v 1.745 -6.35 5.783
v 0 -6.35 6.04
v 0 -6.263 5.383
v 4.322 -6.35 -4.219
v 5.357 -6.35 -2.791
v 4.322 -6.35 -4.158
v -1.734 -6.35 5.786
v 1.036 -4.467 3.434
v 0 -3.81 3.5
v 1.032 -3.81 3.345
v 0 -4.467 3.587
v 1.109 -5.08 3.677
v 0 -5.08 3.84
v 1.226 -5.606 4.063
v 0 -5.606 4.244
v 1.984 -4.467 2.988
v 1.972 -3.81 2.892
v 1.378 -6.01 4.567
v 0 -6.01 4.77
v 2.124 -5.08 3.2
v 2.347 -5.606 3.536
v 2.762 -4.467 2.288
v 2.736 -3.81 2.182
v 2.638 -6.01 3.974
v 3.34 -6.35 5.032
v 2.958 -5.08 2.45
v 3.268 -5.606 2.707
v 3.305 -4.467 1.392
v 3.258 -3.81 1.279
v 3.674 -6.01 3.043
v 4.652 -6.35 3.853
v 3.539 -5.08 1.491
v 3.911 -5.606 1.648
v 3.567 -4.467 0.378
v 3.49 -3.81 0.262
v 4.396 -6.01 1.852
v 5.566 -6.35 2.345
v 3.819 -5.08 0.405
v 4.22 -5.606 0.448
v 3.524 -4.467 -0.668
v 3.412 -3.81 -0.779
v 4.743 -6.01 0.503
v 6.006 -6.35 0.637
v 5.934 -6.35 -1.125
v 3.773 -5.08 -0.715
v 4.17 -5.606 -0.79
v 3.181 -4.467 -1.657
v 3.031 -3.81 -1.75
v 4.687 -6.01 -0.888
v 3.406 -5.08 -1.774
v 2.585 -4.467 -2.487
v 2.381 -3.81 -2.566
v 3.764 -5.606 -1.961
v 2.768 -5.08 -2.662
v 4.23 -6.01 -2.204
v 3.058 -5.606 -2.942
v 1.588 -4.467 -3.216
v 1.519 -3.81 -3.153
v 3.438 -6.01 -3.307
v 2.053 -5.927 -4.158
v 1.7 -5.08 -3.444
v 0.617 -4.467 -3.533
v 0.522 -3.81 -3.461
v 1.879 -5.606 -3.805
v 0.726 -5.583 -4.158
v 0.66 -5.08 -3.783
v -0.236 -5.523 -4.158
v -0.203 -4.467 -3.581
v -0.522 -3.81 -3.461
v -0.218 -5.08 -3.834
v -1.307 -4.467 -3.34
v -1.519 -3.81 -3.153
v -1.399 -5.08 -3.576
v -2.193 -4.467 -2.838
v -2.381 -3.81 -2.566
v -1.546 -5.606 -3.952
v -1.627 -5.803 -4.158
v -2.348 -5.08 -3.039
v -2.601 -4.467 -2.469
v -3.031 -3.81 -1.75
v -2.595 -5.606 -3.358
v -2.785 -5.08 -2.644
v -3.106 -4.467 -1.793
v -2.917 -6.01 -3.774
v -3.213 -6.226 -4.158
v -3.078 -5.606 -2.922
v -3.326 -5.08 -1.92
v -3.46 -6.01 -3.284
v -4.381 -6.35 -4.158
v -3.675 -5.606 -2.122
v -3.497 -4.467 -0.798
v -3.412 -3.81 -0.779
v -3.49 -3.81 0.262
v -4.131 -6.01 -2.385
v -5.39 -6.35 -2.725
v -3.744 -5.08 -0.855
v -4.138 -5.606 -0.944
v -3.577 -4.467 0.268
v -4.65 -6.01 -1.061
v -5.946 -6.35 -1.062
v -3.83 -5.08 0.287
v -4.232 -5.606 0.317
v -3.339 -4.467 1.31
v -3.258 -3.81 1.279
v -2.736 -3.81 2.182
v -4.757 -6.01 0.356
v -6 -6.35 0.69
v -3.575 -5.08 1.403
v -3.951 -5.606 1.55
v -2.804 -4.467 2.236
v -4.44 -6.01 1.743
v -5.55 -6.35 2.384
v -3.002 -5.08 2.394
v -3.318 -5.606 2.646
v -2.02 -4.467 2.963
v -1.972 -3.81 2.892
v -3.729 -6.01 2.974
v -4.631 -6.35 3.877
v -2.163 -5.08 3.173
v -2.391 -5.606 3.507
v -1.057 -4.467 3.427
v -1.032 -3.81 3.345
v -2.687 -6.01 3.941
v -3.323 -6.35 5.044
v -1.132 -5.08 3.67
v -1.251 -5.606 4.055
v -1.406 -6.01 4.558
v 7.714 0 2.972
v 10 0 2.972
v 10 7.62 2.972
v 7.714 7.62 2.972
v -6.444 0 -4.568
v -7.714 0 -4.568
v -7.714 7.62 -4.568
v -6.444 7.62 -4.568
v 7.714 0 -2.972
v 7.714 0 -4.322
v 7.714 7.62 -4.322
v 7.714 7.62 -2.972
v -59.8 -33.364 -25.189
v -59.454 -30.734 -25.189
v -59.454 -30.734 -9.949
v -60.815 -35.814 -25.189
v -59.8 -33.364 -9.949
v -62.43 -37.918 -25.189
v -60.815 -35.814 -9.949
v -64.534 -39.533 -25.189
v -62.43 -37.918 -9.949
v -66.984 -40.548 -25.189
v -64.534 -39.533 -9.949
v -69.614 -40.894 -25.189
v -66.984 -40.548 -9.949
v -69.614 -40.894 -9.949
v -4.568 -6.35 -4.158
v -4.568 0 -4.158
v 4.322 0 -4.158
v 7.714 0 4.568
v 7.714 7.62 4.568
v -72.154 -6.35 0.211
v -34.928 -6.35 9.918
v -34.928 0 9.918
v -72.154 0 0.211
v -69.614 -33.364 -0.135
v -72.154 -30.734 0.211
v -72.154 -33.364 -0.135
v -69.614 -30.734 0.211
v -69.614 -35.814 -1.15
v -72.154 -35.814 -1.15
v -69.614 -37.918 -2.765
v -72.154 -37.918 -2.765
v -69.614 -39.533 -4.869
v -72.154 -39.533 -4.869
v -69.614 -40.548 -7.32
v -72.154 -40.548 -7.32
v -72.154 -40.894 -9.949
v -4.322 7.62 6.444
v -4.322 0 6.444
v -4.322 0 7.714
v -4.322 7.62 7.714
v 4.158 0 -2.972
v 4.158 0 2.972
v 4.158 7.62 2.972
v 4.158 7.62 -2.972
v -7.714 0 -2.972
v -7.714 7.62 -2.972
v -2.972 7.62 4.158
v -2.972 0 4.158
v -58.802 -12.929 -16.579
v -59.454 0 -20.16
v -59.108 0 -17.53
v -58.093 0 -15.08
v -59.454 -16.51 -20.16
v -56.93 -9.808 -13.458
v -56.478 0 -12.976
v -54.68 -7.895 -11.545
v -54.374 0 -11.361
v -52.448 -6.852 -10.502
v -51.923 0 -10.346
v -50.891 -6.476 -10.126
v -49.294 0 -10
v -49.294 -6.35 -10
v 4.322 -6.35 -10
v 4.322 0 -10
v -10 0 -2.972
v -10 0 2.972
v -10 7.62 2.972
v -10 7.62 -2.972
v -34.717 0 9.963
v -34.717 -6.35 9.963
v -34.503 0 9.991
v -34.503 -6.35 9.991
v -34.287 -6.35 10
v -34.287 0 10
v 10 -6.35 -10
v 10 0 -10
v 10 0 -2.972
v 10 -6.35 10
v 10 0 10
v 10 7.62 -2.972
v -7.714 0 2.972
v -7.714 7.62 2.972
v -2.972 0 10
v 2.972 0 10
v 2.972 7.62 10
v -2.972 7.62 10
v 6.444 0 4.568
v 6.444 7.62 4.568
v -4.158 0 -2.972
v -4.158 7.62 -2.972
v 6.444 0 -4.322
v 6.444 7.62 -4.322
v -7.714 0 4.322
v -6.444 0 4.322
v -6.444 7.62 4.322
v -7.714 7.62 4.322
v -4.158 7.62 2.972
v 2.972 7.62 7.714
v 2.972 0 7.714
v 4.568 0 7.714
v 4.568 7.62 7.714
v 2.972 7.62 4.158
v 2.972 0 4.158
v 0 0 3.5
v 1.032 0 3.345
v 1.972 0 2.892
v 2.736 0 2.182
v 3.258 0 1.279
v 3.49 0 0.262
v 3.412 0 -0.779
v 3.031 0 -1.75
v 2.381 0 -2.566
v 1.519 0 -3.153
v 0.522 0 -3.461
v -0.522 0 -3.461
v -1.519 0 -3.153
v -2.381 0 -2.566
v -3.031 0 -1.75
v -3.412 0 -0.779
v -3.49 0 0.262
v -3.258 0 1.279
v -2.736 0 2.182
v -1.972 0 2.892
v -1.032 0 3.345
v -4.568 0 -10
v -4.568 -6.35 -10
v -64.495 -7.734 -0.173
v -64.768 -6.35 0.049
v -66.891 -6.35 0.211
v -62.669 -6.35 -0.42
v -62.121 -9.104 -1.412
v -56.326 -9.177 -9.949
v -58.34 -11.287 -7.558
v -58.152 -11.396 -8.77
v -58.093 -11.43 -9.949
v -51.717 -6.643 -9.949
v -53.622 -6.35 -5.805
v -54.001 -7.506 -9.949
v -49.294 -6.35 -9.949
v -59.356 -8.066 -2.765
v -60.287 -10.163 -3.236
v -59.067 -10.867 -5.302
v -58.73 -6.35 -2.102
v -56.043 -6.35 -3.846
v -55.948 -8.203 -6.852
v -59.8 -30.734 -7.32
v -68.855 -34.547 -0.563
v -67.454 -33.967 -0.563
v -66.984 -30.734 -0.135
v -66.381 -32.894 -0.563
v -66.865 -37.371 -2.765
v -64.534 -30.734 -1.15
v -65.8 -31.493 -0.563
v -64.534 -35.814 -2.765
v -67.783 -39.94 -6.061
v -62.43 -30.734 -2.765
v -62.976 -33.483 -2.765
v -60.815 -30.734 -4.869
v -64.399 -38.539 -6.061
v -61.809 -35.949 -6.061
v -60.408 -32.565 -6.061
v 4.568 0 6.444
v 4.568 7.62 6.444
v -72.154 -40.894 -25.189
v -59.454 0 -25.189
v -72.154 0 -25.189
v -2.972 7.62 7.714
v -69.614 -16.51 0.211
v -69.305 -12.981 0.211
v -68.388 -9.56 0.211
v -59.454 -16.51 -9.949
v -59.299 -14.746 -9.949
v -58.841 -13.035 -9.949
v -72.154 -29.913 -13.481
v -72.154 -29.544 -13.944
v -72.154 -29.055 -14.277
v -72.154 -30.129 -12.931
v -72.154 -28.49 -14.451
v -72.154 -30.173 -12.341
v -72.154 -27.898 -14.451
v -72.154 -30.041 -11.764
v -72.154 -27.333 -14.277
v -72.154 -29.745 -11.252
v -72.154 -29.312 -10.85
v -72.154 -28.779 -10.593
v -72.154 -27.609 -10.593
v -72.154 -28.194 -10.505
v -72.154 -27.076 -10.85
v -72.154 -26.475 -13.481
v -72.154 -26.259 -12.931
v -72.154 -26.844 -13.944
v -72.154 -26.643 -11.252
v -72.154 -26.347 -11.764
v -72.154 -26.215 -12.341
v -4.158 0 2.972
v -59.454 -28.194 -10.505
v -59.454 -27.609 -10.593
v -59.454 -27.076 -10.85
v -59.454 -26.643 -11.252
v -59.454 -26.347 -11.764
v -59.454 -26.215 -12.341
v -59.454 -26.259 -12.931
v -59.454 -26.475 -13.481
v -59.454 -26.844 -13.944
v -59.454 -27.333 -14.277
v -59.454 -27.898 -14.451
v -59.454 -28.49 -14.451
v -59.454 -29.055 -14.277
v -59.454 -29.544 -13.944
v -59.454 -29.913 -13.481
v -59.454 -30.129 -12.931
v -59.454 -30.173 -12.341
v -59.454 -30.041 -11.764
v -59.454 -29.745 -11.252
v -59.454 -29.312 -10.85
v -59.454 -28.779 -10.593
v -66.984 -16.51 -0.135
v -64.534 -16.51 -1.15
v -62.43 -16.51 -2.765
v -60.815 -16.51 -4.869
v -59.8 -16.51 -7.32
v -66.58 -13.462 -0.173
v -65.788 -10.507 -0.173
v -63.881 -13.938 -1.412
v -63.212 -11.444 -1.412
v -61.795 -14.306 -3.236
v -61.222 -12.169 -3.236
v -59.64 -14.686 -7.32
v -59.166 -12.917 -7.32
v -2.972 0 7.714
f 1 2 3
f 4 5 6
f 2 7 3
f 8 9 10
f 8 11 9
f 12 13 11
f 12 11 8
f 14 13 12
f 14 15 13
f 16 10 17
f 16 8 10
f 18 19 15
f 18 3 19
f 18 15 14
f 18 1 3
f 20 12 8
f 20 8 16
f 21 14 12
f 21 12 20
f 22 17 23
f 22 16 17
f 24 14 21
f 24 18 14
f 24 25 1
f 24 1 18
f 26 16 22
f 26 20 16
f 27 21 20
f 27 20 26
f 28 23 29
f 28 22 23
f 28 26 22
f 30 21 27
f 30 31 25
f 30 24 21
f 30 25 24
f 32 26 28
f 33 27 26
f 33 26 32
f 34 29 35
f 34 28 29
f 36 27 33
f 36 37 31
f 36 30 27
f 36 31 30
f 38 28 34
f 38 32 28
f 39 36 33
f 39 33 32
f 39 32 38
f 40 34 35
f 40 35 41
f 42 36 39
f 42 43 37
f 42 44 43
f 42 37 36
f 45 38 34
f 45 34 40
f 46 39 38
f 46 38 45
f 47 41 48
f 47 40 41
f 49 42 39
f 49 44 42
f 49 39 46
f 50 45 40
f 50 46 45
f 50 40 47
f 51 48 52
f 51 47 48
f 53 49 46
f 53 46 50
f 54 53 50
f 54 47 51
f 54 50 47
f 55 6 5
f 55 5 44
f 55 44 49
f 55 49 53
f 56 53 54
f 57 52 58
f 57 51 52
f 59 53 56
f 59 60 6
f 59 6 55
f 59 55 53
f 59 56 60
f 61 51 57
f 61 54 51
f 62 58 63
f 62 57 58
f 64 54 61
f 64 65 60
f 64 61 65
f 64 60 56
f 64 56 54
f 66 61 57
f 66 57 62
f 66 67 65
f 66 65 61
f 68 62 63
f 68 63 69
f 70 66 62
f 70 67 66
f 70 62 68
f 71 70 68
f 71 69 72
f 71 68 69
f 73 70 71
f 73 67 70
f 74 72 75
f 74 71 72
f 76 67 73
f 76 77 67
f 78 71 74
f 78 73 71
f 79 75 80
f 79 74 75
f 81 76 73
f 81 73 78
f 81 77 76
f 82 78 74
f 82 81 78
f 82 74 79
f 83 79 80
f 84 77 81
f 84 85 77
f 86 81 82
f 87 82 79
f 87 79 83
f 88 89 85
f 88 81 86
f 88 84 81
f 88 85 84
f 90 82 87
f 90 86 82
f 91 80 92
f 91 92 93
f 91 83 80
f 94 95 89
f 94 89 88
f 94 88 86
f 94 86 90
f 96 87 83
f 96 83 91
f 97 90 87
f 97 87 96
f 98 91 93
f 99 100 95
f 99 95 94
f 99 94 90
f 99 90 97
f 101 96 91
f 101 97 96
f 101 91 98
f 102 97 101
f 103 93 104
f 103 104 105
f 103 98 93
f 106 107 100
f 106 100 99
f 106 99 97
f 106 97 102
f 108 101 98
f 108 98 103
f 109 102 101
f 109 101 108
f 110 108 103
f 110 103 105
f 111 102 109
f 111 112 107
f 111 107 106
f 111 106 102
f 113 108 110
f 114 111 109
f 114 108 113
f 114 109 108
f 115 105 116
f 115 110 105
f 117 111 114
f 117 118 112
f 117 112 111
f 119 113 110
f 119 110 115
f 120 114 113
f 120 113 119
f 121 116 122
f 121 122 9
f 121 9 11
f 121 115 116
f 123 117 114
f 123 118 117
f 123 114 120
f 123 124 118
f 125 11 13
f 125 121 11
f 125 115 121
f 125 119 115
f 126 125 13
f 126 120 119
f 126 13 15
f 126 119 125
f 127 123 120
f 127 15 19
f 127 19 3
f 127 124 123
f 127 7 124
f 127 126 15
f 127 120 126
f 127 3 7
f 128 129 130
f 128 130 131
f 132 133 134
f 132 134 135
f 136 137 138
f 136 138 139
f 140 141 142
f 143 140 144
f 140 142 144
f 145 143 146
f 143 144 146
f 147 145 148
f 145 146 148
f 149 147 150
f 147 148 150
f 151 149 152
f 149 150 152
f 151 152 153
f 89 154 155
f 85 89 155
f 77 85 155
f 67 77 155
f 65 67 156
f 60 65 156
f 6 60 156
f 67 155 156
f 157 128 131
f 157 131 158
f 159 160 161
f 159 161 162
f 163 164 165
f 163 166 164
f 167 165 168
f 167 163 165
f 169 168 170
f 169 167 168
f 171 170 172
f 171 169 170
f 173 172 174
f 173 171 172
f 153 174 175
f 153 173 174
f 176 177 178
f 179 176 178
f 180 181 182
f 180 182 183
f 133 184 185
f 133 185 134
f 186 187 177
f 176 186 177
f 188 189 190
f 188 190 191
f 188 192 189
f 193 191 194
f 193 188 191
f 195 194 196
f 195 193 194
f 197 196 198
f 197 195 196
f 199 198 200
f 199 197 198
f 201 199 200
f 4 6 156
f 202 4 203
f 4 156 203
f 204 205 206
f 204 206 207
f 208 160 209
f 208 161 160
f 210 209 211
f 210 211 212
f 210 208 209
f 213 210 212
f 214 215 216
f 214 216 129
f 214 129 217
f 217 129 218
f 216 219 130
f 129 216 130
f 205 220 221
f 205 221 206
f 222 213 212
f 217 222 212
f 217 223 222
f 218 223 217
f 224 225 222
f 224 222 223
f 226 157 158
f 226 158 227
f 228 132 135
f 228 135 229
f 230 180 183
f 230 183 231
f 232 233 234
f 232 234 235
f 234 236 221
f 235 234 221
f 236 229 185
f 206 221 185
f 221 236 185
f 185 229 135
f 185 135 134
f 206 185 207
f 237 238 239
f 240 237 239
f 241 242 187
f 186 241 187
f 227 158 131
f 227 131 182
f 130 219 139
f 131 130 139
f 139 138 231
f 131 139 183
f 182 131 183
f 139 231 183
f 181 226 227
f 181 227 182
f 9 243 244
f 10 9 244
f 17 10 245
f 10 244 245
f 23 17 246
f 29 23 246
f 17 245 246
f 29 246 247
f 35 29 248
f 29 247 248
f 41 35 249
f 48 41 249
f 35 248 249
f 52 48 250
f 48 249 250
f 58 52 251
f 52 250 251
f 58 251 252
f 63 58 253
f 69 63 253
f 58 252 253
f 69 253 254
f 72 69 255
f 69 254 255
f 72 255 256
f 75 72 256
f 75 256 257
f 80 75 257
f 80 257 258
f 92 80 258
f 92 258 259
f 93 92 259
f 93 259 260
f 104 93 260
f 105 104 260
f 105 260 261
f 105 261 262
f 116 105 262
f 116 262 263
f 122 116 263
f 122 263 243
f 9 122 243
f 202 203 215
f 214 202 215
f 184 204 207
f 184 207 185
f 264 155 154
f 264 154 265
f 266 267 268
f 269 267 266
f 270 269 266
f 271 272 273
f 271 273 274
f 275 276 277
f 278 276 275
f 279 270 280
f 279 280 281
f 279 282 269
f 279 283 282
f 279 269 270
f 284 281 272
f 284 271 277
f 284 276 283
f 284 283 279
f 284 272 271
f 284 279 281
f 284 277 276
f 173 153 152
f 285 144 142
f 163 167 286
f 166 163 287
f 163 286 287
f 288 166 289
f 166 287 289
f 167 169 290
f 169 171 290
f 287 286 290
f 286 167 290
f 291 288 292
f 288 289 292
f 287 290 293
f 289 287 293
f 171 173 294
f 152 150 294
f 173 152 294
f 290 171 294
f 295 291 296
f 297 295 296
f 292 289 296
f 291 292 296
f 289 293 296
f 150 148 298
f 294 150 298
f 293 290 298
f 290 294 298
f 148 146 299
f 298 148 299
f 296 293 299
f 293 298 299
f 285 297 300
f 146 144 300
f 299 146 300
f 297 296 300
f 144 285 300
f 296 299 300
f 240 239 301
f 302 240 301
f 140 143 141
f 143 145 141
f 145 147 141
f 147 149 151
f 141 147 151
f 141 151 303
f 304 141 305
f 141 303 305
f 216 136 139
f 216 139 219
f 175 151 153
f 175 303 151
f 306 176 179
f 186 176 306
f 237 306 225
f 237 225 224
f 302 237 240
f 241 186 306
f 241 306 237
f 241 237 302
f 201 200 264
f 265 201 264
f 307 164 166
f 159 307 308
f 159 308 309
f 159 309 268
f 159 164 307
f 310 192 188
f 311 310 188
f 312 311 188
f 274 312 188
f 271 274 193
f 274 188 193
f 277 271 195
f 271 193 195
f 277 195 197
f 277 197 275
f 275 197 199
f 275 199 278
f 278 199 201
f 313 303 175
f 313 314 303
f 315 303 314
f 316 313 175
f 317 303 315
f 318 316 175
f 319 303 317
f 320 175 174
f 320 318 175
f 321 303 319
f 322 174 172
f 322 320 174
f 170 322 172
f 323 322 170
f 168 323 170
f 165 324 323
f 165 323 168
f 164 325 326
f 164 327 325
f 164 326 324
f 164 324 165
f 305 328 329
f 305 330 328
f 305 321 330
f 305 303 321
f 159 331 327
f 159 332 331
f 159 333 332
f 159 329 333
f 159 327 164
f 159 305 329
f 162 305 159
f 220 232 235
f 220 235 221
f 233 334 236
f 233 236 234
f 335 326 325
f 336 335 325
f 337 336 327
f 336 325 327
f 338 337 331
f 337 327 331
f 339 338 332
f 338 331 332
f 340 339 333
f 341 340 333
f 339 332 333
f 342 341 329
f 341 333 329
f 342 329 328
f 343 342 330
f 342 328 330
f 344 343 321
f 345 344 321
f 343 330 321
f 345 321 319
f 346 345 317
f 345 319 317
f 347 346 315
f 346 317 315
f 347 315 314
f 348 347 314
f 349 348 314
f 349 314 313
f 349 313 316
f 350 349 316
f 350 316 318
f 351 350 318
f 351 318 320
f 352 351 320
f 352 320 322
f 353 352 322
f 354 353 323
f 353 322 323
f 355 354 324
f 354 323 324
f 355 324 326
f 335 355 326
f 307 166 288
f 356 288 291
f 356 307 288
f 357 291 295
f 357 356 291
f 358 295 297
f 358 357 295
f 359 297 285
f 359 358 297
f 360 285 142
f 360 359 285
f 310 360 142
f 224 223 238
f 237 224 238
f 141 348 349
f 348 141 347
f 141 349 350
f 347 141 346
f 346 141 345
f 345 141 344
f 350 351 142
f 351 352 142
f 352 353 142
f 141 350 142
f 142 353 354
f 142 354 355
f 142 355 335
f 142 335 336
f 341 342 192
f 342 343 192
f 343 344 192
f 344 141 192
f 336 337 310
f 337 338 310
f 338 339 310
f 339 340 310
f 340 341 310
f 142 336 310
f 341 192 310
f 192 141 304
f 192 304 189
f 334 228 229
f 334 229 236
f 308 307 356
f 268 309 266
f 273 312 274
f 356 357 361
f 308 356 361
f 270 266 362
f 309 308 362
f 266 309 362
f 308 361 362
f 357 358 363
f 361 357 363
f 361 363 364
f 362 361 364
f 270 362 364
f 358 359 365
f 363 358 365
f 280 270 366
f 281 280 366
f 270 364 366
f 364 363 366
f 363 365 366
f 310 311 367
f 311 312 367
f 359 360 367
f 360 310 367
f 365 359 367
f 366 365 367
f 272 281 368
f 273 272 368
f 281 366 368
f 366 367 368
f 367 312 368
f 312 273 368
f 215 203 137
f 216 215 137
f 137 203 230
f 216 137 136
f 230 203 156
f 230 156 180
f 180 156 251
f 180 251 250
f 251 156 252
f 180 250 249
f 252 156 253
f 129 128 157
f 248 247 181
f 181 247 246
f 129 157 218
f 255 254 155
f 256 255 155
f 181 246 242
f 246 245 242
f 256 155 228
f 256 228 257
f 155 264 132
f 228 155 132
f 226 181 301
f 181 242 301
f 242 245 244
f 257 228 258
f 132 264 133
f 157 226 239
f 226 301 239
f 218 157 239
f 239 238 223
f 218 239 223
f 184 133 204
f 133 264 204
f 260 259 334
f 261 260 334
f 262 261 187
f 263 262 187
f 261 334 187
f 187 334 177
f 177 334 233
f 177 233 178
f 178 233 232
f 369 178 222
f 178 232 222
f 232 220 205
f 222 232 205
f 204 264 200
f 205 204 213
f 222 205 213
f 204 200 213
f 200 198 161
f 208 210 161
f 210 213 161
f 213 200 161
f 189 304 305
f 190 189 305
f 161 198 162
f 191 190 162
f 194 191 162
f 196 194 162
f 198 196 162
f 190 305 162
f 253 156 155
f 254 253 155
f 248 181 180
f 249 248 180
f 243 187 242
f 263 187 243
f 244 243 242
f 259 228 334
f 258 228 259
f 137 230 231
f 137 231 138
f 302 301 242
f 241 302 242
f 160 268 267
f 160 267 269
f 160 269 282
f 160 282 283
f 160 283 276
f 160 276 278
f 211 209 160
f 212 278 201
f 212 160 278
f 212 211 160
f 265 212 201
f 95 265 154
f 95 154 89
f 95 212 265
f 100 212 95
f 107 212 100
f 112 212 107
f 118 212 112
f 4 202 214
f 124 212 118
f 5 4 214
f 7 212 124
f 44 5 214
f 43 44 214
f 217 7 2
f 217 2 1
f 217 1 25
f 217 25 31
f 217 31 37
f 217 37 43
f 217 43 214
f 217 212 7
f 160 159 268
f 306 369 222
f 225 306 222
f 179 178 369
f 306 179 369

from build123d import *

# Parameters (mm, degrees)
BOSS_EXTRUDE1_DEPTH   = 7.62
BOSS_EXTRUDE1_2_DEPTH = 7.62
BOSS_EXTRUDE1_3_DEPTH = 7.62
BOSS_EXTRUDE1_4_DEPTH = 7.62
SKETCH2_W             = 82.1538108
SKETCH2_H             = 20
BOSS_EXTRUDE2_DEPTH   = 6.35
CUT_EXTRUDE1_DEPTH    = 75.17097352
FILLET1_R             = 2.54
SKETCH13_R            = 3.5
CUT_EXTRUDE5_DEPTH    = 74.240950383
FILLET6_R             = 2.54
SKETCH14_W            = 8.89
SKETCH14_H            = 5.842
CUT_EXTRUDE6_DEPTH    = 75.17097352
SKETCH15_W            = 25.4
SKETCH15_H            = 40.894
BOSS_EXTRUDE3_DEPTH   = 12.7
FILLET15_R            = 10.16
FILLET16_R            = 10.16
FILLET17_R            = 10.16
FILLET18_R            = 10.16
SKETCH18_R            = 1.984375
CUT_EXTRUDE9_DEPTH    = 12.7


with BuildPart() as part:
    # Sketch1 → Boss-Extrude1 (new body)
    with BuildSketch(Plane(origin=(0, 0, 0), x_dir=(1, 0, 0), z_dir=(0, 1, 0))):
        Polygon((2.9718, 10), (-2.9718, 10), (-2.9718, 7.714), (-4.567901235, 7.714), (-4.567901235, 6.444), (-2.9718, 4.158), (2.9718, 4.158), (4.322098765, 6.444), (4.322098765, 7.714), (2.9718, 7.714), align=None)
    extrude(amount=BOSS_EXTRUDE1_DEPTH)



with BuildPart() as body_2:
    # Sketch1 → Boss-Extrude1 2 (new body)
    with BuildSketch(Plane(origin=(0, 0, 0), x_dir=(1, 0, 0), z_dir=(0, 1, 0))):
        Polygon((4.158, -2.9718), (4.158, 2.9718), (6.444, 4.322098765), (7.714, 4.322098765), (7.714, 2.9718), (10, 2.9718), (10, -2.9718), (7.714, -2.9718), (7.714, -4.567901235), (6.444, -4.567901235), align=None)
    extrude(amount=BOSS_EXTRUDE1_2_DEPTH)


with BuildPart() as body_3:
    # Sketch1 → Boss-Extrude1 3 (new body)
    with BuildSketch(Plane(origin=(0, 0, 0), x_dir=(1, 0, 0), z_dir=(0, 1, 0))):
        Polygon((-10, -2.9718), (-10, 2.9718), (-7.714, 2.9718), (-7.714, 4.567901235), (-6.444, 4.567901235), (-4.158, 2.9718), (-4.158, -2.9718), (-6.444, -4.322098765), (-7.714, -4.322098765), (-7.714, -2.9718), align=None)
    extrude(amount=BOSS_EXTRUDE1_3_DEPTH)


with BuildPart() as body_4:
    # Sketch1 → Boss-Extrude1 4 (new body)
    with BuildSketch(Plane(origin=(0, 0, 0), x_dir=(1, 0, 0), z_dir=(0, 1, 0))):
        Polygon((4.567901235, -6.444), (2.9718, -4.158), (-2.9718, -4.158), (-4.322098765, -6.444), (-4.322098765, -7.714), (-2.9718, -7.714), (-2.9718, -10), (2.9718, -10), (2.9718, -7.714), (4.567901235, -7.714), align=None)
    extrude(amount=BOSS_EXTRUDE1_4_DEPTH)


with BuildPart() as part_1:
    add(part.part)

    add(body_2.part)  # Boss-Extrude2 merges body 2

    add(body_3.part)  # Boss-Extrude2 merges body 3

    add(body_4.part)  # Boss-Extrude2 merges body 4
    # Sketch2 → Boss-Extrude2 (add)
    with BuildSketch(Plane.XZ):
        with Locations((-31.0769054, 0)):
            Rectangle(SKETCH2_W, SKETCH2_H)
    extrude(amount=BOSS_EXTRUDE2_DEPTH)

    # Sketch4 → Cut-Extrude1 (cut, through all)
    with BuildSketch(Plane(origin=(0, -6.35, 0), x_dir=(-1, 0, 0), z_dir=(0, -1, 0))):
        Polygon((72.1538108, -10), (34.6126108, -10), (72.1538108, -0.2108), align=None)
    extrude(amount=-CUT_EXTRUDE1_DEPTH, mode=Mode.SUBTRACT)

    # Fillet1
    fillet1_edges = [part_1.edges().sort_by_distance(p)[0] for p in [
        (-34.6126108, -3.175, 10),
    ]]
    fillet(fillet1_edges, radius=FILLET1_R)

    # Sketch13 → Cut-Extrude5 (cut, through all)
    with BuildSketch(Plane(origin=(0, 0, 0), x_dir=(1, 0, 0), z_dir=(0, 1, 0))):
        with Locations(Location((0, 0, 0), (0, 0, 270))):
            Circle(SKETCH13_R)
    extrude(amount=-CUT_EXTRUDE5_DEPTH, mode=Mode.SUBTRACT)

    # Fillet6
    fillet6_edges = [part_1.edges().sort_by_distance(p)[0] for p in [
        (0, -6.35, -3.5),
    ]]
    fillet(fillet6_edges, radius=FILLET6_R)

    # Sketch14 → Cut-Extrude6 (cut, through all)
    with BuildSketch(Plane(origin=(0, 7.62, 0), x_dir=(1, 0, 0), z_dir=(0, 1, 0))):
        with Locations((-0.122901235, 7.079)):
            Rectangle(SKETCH14_W, SKETCH14_H)
    extrude(amount=-CUT_EXTRUDE6_DEPTH, mode=Mode.SUBTRACT)

    # Sketch15 → Boss-Extrude3 (add)
    with BuildSketch(Plane.ZY.offset(72.1538108)):
        with Locations((-12.4892, -20.447)):
            Rectangle(SKETCH15_W, SKETCH15_H)
    extrude(amount=-BOSS_EXTRUDE3_DEPTH)

    # Fillet15
    fillet15_edges = [part_1.edges().sort_by_distance(p)[0] for p in [
        (-59.4538108, -6.35, -4.8946),
    ]]
    fillet(fillet15_edges, radius=FILLET15_R)

    # Fillet16
    fillet16_edges = [part_1.edges().sort_by_distance(p)[0] for p in [
        (-59.4538108, -8.255, -10),
    ]]
    fillet(fillet16_edges, radius=FILLET16_R)

    # Fillet17
    fillet17_edges = [part_1.edges().sort_by_distance(p)[0] for p in [
        (-59.4538108, -40.894, -12.4892),
    ]]
    fillet(fillet17_edges, radius=FILLET17_R)

    # Fillet18
    fillet18_edges = [part_1.edges().sort_by_distance(p)[0] for p in [
        (-56.478015697, -9.325795103, 0.2108),
        (-70.8838108, -40.894, 0.2108),
        (-59.4538108, -23.622, 0.2108),
        (-62.429605903, -37.918204897, 0.2108),
    ]]
    fillet(fillet18_edges, radius=FILLET18_R)

    # Sketch18 → Cut-Extrude9 (cut)
    with BuildSketch(Plane.ZY.offset(72.1538108)):
        with Locations((-12.4892, -28.194)):
            Circle(SKETCH18_R)
    extrude(amount=-CUT_EXTRUDE9_DEPTH, mode=Mode.SUBTRACT)


solid = part_1.part
